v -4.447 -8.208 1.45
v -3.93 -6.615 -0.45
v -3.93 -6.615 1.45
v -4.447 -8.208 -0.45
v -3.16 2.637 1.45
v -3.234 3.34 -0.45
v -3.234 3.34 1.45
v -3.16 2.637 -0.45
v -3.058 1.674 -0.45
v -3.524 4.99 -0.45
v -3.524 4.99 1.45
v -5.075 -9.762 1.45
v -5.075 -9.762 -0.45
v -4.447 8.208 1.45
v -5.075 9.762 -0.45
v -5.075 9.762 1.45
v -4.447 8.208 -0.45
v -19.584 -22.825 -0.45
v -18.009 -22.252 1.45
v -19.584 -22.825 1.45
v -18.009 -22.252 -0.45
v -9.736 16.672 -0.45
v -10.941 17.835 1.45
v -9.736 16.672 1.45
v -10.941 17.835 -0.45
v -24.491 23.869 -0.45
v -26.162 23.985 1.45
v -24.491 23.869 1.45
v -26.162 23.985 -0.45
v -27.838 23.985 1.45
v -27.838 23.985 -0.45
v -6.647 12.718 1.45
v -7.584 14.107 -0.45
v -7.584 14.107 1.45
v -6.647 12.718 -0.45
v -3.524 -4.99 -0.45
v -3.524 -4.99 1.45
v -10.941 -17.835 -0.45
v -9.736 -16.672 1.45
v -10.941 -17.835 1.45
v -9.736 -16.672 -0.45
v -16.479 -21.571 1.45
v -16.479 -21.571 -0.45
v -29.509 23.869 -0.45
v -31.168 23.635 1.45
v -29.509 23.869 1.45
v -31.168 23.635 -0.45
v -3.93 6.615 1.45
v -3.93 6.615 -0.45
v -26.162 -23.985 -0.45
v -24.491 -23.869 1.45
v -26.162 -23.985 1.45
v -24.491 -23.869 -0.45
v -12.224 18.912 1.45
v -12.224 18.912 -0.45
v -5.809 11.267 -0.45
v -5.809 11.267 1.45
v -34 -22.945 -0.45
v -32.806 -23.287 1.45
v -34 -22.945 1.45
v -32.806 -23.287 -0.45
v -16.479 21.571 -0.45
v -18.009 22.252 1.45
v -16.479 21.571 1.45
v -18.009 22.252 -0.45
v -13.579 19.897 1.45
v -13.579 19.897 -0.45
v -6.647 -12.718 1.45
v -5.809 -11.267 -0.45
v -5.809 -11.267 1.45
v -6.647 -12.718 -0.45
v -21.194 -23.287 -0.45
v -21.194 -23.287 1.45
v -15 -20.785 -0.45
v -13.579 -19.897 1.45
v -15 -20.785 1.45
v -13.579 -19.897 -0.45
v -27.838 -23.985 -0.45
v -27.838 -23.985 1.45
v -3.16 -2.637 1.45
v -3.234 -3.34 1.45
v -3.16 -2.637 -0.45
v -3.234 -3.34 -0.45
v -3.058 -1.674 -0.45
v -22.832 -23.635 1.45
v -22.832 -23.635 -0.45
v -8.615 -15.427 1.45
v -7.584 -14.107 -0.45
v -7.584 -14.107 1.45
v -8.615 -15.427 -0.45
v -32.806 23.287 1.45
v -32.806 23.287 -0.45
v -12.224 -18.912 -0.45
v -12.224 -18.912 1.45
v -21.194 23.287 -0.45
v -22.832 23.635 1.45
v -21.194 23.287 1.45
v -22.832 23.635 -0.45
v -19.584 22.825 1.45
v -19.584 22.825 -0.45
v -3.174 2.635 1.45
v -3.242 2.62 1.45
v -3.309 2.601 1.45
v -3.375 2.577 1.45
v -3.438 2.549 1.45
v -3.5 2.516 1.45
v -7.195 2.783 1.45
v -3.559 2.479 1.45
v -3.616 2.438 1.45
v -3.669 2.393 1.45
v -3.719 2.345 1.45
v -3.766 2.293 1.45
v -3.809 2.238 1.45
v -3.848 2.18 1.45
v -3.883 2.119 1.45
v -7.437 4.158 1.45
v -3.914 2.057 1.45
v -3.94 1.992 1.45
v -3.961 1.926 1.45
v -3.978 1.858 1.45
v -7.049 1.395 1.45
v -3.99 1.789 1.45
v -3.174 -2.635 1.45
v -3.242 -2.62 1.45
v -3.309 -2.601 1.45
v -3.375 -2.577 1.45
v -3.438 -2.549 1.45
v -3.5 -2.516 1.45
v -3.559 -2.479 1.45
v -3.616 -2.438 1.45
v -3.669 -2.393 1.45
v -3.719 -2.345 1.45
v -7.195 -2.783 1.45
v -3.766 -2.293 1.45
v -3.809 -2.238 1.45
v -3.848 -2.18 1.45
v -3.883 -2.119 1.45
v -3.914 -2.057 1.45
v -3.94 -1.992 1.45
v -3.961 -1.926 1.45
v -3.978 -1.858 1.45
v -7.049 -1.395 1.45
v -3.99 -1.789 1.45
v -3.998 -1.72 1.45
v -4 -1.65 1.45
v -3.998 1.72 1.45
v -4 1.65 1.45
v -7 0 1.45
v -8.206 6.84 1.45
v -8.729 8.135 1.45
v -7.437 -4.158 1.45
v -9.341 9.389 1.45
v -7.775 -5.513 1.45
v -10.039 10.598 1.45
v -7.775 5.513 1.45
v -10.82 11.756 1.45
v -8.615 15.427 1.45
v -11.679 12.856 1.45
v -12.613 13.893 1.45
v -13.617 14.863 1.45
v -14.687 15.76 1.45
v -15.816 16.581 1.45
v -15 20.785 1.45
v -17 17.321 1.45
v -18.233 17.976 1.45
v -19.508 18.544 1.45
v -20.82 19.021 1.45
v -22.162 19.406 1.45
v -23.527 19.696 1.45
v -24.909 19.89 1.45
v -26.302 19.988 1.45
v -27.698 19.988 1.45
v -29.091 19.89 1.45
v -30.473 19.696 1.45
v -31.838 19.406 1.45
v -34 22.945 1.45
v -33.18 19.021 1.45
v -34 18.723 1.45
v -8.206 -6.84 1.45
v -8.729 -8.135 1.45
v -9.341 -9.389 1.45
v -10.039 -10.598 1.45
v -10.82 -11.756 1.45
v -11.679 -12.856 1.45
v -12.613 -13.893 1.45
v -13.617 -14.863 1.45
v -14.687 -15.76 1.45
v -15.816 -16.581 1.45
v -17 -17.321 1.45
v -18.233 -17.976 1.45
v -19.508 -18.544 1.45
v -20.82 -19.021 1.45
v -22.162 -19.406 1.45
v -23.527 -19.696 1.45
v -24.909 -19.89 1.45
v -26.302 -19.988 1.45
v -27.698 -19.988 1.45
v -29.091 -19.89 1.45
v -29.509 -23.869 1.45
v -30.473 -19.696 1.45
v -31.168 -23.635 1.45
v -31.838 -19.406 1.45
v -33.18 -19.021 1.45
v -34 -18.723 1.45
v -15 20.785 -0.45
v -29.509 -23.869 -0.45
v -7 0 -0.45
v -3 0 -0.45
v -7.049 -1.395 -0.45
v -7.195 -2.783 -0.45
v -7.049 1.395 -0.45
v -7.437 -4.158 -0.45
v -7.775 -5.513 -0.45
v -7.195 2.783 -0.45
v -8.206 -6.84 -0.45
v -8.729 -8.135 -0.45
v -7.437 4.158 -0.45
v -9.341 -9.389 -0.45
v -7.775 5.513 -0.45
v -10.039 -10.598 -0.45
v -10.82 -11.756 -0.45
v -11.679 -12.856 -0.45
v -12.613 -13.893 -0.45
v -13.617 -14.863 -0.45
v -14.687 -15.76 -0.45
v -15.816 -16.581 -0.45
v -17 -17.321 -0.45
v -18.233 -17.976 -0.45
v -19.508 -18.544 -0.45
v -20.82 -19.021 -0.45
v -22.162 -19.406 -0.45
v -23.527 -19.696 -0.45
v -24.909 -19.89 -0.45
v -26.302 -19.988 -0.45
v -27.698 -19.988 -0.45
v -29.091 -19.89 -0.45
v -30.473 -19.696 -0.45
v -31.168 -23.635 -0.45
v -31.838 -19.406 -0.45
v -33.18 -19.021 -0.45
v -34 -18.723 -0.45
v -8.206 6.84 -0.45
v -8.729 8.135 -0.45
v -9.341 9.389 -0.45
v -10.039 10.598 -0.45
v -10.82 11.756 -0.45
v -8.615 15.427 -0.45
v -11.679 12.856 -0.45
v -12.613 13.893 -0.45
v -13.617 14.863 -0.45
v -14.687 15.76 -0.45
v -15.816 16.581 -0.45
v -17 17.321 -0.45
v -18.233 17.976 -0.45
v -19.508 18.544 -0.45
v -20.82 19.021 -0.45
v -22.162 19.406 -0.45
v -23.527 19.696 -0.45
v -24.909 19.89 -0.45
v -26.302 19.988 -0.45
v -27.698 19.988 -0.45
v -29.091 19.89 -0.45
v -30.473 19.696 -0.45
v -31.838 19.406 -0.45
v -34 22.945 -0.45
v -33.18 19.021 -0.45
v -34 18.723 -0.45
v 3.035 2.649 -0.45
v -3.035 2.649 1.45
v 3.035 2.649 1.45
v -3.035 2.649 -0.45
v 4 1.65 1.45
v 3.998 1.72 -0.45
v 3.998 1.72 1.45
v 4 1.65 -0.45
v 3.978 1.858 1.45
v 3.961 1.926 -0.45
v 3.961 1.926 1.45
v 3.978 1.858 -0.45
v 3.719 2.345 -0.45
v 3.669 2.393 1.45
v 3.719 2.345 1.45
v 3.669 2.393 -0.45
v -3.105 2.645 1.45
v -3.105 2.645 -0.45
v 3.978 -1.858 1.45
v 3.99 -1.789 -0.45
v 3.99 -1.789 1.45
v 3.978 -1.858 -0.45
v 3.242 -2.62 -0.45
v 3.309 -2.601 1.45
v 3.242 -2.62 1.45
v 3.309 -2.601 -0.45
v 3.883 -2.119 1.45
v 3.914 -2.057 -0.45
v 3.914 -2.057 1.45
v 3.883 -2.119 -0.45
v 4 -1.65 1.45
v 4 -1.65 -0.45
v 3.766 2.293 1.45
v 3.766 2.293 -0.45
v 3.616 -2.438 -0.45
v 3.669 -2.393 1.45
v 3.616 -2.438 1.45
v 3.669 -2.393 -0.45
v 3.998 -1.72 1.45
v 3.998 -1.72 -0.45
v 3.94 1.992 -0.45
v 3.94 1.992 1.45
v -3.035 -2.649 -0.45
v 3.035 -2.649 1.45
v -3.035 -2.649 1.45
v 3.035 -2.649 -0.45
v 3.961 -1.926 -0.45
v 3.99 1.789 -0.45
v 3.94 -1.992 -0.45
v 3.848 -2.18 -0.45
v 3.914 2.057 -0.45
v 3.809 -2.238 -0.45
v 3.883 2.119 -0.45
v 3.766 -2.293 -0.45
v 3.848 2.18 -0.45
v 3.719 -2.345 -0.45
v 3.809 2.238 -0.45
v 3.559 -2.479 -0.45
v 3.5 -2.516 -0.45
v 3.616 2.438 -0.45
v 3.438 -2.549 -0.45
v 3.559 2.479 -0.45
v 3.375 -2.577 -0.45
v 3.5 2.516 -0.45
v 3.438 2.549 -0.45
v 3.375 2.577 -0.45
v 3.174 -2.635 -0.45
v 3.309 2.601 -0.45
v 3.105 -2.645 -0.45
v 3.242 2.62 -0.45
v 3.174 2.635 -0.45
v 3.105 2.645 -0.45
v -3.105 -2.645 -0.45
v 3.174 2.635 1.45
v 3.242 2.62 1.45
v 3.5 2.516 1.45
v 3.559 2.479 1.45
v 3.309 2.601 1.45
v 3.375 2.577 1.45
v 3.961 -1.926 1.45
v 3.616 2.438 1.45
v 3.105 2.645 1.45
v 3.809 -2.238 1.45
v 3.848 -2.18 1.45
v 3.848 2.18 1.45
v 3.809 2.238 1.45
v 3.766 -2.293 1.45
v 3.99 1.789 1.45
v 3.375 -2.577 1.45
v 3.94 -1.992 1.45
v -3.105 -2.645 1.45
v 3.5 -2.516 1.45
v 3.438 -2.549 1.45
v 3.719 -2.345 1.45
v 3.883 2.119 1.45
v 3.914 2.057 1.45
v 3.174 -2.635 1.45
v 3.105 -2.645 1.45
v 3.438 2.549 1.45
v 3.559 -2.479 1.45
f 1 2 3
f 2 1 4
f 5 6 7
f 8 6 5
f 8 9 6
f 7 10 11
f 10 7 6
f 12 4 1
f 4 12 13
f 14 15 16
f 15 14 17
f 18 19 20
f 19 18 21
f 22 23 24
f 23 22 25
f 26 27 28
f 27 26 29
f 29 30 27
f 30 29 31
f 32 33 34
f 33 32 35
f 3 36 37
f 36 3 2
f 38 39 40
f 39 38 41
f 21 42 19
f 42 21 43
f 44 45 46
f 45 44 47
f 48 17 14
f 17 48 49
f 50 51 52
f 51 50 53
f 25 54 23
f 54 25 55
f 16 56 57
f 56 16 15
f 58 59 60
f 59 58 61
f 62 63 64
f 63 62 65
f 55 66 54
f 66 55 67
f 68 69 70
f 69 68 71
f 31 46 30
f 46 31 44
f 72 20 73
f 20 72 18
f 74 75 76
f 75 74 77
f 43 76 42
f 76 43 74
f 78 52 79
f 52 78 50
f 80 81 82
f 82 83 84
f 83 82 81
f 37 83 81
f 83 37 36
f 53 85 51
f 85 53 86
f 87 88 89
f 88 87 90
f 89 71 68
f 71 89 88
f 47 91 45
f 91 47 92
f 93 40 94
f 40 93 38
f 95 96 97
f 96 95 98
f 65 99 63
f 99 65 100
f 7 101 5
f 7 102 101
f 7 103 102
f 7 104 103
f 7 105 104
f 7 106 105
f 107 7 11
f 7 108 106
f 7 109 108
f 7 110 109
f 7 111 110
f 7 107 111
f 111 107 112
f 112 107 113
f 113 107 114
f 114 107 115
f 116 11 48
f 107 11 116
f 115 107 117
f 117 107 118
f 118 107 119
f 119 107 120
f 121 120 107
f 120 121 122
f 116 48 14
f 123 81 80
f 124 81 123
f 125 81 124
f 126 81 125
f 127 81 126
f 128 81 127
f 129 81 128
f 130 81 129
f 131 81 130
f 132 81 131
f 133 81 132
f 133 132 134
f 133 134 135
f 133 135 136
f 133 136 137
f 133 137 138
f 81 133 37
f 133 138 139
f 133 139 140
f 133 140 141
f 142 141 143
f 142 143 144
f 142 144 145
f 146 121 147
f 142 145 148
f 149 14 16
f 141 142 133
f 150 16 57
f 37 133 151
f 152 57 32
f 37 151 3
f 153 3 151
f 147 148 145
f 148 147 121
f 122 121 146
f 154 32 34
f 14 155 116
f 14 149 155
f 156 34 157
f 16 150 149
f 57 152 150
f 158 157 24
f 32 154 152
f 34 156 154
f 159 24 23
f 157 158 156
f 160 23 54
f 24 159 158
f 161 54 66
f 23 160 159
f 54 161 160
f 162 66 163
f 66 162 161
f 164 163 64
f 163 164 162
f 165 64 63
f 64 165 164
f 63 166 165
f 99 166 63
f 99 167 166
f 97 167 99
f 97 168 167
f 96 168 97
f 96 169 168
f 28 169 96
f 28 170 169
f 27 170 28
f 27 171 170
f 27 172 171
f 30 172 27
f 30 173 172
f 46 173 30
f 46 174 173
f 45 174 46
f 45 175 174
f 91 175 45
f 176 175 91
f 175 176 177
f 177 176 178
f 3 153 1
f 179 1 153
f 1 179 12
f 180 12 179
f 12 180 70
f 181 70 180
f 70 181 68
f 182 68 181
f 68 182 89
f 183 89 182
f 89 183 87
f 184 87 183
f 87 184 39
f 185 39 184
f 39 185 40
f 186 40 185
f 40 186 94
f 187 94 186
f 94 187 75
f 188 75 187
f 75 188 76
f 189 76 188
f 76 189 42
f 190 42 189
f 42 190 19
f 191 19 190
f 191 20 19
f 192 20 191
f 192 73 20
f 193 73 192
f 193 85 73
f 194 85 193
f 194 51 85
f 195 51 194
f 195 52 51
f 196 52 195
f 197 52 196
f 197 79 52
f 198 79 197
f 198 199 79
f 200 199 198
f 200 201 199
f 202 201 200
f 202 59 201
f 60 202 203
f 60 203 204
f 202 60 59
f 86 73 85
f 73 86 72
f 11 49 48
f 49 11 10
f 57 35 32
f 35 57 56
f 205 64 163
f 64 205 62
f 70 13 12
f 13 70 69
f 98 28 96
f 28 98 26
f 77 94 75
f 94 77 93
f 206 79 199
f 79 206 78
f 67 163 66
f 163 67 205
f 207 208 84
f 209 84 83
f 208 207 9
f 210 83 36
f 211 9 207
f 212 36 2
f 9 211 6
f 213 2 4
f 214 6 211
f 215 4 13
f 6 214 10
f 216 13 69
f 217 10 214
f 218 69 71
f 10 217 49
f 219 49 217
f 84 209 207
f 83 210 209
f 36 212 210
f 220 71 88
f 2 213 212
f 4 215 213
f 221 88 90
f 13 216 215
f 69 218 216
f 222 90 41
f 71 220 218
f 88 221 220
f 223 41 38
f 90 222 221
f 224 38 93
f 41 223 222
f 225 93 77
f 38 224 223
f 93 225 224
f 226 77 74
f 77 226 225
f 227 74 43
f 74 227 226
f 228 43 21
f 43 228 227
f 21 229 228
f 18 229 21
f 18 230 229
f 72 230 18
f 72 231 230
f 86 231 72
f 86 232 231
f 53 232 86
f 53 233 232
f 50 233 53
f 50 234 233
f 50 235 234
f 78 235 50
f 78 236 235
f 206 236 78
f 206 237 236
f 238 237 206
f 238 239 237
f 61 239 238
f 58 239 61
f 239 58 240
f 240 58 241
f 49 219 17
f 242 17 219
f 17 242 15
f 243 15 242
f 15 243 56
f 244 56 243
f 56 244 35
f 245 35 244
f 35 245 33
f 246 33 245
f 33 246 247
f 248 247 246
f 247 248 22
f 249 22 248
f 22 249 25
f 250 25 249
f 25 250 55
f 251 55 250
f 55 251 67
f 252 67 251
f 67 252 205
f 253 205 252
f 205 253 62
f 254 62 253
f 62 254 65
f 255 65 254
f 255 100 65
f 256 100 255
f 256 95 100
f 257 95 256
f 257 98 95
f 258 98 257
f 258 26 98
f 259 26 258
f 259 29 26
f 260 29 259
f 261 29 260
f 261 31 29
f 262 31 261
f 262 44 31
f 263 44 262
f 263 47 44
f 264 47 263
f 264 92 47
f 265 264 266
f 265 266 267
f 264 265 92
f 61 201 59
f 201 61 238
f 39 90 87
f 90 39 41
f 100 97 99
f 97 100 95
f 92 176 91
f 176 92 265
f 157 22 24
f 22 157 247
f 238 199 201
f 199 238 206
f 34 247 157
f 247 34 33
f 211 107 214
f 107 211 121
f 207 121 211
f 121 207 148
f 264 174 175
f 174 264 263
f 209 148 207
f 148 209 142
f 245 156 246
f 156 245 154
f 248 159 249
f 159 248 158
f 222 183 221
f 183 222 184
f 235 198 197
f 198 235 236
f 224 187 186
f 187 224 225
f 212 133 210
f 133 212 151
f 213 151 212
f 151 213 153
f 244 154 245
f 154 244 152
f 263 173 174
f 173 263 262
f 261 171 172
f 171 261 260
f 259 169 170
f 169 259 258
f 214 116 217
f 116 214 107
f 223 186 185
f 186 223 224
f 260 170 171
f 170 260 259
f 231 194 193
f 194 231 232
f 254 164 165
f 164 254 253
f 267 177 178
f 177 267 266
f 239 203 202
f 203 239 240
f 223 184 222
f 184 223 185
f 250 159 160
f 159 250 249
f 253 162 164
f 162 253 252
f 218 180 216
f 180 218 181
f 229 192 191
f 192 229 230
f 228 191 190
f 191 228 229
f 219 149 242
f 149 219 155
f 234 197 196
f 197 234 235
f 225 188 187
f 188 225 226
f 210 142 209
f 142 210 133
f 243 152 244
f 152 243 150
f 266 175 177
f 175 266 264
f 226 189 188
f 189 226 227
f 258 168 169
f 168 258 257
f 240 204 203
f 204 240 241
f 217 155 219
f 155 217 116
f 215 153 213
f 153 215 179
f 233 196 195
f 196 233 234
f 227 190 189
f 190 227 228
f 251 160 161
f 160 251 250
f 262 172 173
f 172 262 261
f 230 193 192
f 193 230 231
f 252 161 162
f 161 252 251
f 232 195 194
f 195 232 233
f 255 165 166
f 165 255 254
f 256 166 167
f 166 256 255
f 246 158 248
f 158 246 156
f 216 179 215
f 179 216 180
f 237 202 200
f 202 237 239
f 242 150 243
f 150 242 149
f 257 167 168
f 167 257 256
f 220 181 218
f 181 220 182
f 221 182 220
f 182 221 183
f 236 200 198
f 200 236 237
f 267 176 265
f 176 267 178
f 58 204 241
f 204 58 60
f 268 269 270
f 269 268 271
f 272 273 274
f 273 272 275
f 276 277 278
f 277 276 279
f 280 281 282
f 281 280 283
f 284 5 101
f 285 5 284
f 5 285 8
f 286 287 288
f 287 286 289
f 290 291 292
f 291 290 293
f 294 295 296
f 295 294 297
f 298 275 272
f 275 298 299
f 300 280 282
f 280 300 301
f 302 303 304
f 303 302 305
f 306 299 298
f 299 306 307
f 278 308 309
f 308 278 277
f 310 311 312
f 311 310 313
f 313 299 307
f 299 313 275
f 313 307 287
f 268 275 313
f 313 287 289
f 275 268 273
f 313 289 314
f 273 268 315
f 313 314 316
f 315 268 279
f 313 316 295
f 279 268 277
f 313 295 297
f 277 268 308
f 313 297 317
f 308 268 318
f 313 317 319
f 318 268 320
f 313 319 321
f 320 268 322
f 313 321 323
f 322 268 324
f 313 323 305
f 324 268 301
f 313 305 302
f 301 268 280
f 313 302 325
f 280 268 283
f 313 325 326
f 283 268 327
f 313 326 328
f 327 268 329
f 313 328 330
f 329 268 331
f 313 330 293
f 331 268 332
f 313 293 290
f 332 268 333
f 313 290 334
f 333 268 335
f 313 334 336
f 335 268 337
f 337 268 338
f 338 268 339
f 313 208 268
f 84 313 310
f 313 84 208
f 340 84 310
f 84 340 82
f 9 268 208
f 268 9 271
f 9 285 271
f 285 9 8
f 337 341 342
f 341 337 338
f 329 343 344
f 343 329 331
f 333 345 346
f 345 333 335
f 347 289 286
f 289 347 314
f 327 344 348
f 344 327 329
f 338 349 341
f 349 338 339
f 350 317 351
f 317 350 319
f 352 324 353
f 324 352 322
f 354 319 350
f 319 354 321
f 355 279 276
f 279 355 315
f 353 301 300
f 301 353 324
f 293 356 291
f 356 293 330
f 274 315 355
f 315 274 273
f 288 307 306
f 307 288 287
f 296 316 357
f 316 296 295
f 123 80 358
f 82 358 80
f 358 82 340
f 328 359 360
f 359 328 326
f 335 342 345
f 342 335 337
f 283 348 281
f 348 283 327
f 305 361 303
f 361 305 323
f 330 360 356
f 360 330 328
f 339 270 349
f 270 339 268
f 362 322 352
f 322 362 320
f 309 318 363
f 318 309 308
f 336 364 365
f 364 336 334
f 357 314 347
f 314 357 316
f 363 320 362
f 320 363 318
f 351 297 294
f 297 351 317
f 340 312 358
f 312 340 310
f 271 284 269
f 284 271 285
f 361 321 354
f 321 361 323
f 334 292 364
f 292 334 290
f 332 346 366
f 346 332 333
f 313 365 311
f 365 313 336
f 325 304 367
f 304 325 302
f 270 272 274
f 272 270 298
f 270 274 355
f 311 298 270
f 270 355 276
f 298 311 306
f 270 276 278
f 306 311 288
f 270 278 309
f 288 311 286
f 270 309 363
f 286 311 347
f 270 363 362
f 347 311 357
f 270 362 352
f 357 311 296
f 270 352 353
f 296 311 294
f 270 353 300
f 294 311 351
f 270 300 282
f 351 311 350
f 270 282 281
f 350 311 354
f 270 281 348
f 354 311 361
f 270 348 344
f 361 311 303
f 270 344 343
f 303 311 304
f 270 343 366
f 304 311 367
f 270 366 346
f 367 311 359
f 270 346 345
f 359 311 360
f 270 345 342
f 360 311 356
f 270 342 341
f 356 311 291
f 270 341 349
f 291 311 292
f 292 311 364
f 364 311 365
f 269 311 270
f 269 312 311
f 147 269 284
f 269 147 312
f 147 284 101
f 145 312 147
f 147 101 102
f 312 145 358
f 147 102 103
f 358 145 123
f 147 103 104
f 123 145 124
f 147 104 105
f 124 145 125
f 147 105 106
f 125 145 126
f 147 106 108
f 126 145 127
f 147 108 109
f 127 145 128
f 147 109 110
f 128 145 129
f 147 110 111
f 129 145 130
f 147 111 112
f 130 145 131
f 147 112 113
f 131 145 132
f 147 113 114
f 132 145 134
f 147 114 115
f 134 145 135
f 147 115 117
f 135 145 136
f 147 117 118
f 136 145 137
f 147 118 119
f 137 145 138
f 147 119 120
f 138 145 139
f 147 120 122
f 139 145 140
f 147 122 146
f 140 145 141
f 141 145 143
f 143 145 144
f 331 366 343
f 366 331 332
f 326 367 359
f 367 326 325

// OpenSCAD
$fn = 90;

minkowski() {
    cube([8-2, 5.3-2, 1.9 - 1], true);
    cylinder(d = 2);
}
translate([-27, 0, -0.45]) difference() {
    cylinder(d = 48, h = 1.9);
    translate([0, 0, -0.5]) cylinder(d = 40, h = 3);
    translate([-47, 0, -0.5])cube([80, 80, 6], true);
}

//translate([0, 0, 0.5]) #cube([7, 5.5, 2.1], true);
